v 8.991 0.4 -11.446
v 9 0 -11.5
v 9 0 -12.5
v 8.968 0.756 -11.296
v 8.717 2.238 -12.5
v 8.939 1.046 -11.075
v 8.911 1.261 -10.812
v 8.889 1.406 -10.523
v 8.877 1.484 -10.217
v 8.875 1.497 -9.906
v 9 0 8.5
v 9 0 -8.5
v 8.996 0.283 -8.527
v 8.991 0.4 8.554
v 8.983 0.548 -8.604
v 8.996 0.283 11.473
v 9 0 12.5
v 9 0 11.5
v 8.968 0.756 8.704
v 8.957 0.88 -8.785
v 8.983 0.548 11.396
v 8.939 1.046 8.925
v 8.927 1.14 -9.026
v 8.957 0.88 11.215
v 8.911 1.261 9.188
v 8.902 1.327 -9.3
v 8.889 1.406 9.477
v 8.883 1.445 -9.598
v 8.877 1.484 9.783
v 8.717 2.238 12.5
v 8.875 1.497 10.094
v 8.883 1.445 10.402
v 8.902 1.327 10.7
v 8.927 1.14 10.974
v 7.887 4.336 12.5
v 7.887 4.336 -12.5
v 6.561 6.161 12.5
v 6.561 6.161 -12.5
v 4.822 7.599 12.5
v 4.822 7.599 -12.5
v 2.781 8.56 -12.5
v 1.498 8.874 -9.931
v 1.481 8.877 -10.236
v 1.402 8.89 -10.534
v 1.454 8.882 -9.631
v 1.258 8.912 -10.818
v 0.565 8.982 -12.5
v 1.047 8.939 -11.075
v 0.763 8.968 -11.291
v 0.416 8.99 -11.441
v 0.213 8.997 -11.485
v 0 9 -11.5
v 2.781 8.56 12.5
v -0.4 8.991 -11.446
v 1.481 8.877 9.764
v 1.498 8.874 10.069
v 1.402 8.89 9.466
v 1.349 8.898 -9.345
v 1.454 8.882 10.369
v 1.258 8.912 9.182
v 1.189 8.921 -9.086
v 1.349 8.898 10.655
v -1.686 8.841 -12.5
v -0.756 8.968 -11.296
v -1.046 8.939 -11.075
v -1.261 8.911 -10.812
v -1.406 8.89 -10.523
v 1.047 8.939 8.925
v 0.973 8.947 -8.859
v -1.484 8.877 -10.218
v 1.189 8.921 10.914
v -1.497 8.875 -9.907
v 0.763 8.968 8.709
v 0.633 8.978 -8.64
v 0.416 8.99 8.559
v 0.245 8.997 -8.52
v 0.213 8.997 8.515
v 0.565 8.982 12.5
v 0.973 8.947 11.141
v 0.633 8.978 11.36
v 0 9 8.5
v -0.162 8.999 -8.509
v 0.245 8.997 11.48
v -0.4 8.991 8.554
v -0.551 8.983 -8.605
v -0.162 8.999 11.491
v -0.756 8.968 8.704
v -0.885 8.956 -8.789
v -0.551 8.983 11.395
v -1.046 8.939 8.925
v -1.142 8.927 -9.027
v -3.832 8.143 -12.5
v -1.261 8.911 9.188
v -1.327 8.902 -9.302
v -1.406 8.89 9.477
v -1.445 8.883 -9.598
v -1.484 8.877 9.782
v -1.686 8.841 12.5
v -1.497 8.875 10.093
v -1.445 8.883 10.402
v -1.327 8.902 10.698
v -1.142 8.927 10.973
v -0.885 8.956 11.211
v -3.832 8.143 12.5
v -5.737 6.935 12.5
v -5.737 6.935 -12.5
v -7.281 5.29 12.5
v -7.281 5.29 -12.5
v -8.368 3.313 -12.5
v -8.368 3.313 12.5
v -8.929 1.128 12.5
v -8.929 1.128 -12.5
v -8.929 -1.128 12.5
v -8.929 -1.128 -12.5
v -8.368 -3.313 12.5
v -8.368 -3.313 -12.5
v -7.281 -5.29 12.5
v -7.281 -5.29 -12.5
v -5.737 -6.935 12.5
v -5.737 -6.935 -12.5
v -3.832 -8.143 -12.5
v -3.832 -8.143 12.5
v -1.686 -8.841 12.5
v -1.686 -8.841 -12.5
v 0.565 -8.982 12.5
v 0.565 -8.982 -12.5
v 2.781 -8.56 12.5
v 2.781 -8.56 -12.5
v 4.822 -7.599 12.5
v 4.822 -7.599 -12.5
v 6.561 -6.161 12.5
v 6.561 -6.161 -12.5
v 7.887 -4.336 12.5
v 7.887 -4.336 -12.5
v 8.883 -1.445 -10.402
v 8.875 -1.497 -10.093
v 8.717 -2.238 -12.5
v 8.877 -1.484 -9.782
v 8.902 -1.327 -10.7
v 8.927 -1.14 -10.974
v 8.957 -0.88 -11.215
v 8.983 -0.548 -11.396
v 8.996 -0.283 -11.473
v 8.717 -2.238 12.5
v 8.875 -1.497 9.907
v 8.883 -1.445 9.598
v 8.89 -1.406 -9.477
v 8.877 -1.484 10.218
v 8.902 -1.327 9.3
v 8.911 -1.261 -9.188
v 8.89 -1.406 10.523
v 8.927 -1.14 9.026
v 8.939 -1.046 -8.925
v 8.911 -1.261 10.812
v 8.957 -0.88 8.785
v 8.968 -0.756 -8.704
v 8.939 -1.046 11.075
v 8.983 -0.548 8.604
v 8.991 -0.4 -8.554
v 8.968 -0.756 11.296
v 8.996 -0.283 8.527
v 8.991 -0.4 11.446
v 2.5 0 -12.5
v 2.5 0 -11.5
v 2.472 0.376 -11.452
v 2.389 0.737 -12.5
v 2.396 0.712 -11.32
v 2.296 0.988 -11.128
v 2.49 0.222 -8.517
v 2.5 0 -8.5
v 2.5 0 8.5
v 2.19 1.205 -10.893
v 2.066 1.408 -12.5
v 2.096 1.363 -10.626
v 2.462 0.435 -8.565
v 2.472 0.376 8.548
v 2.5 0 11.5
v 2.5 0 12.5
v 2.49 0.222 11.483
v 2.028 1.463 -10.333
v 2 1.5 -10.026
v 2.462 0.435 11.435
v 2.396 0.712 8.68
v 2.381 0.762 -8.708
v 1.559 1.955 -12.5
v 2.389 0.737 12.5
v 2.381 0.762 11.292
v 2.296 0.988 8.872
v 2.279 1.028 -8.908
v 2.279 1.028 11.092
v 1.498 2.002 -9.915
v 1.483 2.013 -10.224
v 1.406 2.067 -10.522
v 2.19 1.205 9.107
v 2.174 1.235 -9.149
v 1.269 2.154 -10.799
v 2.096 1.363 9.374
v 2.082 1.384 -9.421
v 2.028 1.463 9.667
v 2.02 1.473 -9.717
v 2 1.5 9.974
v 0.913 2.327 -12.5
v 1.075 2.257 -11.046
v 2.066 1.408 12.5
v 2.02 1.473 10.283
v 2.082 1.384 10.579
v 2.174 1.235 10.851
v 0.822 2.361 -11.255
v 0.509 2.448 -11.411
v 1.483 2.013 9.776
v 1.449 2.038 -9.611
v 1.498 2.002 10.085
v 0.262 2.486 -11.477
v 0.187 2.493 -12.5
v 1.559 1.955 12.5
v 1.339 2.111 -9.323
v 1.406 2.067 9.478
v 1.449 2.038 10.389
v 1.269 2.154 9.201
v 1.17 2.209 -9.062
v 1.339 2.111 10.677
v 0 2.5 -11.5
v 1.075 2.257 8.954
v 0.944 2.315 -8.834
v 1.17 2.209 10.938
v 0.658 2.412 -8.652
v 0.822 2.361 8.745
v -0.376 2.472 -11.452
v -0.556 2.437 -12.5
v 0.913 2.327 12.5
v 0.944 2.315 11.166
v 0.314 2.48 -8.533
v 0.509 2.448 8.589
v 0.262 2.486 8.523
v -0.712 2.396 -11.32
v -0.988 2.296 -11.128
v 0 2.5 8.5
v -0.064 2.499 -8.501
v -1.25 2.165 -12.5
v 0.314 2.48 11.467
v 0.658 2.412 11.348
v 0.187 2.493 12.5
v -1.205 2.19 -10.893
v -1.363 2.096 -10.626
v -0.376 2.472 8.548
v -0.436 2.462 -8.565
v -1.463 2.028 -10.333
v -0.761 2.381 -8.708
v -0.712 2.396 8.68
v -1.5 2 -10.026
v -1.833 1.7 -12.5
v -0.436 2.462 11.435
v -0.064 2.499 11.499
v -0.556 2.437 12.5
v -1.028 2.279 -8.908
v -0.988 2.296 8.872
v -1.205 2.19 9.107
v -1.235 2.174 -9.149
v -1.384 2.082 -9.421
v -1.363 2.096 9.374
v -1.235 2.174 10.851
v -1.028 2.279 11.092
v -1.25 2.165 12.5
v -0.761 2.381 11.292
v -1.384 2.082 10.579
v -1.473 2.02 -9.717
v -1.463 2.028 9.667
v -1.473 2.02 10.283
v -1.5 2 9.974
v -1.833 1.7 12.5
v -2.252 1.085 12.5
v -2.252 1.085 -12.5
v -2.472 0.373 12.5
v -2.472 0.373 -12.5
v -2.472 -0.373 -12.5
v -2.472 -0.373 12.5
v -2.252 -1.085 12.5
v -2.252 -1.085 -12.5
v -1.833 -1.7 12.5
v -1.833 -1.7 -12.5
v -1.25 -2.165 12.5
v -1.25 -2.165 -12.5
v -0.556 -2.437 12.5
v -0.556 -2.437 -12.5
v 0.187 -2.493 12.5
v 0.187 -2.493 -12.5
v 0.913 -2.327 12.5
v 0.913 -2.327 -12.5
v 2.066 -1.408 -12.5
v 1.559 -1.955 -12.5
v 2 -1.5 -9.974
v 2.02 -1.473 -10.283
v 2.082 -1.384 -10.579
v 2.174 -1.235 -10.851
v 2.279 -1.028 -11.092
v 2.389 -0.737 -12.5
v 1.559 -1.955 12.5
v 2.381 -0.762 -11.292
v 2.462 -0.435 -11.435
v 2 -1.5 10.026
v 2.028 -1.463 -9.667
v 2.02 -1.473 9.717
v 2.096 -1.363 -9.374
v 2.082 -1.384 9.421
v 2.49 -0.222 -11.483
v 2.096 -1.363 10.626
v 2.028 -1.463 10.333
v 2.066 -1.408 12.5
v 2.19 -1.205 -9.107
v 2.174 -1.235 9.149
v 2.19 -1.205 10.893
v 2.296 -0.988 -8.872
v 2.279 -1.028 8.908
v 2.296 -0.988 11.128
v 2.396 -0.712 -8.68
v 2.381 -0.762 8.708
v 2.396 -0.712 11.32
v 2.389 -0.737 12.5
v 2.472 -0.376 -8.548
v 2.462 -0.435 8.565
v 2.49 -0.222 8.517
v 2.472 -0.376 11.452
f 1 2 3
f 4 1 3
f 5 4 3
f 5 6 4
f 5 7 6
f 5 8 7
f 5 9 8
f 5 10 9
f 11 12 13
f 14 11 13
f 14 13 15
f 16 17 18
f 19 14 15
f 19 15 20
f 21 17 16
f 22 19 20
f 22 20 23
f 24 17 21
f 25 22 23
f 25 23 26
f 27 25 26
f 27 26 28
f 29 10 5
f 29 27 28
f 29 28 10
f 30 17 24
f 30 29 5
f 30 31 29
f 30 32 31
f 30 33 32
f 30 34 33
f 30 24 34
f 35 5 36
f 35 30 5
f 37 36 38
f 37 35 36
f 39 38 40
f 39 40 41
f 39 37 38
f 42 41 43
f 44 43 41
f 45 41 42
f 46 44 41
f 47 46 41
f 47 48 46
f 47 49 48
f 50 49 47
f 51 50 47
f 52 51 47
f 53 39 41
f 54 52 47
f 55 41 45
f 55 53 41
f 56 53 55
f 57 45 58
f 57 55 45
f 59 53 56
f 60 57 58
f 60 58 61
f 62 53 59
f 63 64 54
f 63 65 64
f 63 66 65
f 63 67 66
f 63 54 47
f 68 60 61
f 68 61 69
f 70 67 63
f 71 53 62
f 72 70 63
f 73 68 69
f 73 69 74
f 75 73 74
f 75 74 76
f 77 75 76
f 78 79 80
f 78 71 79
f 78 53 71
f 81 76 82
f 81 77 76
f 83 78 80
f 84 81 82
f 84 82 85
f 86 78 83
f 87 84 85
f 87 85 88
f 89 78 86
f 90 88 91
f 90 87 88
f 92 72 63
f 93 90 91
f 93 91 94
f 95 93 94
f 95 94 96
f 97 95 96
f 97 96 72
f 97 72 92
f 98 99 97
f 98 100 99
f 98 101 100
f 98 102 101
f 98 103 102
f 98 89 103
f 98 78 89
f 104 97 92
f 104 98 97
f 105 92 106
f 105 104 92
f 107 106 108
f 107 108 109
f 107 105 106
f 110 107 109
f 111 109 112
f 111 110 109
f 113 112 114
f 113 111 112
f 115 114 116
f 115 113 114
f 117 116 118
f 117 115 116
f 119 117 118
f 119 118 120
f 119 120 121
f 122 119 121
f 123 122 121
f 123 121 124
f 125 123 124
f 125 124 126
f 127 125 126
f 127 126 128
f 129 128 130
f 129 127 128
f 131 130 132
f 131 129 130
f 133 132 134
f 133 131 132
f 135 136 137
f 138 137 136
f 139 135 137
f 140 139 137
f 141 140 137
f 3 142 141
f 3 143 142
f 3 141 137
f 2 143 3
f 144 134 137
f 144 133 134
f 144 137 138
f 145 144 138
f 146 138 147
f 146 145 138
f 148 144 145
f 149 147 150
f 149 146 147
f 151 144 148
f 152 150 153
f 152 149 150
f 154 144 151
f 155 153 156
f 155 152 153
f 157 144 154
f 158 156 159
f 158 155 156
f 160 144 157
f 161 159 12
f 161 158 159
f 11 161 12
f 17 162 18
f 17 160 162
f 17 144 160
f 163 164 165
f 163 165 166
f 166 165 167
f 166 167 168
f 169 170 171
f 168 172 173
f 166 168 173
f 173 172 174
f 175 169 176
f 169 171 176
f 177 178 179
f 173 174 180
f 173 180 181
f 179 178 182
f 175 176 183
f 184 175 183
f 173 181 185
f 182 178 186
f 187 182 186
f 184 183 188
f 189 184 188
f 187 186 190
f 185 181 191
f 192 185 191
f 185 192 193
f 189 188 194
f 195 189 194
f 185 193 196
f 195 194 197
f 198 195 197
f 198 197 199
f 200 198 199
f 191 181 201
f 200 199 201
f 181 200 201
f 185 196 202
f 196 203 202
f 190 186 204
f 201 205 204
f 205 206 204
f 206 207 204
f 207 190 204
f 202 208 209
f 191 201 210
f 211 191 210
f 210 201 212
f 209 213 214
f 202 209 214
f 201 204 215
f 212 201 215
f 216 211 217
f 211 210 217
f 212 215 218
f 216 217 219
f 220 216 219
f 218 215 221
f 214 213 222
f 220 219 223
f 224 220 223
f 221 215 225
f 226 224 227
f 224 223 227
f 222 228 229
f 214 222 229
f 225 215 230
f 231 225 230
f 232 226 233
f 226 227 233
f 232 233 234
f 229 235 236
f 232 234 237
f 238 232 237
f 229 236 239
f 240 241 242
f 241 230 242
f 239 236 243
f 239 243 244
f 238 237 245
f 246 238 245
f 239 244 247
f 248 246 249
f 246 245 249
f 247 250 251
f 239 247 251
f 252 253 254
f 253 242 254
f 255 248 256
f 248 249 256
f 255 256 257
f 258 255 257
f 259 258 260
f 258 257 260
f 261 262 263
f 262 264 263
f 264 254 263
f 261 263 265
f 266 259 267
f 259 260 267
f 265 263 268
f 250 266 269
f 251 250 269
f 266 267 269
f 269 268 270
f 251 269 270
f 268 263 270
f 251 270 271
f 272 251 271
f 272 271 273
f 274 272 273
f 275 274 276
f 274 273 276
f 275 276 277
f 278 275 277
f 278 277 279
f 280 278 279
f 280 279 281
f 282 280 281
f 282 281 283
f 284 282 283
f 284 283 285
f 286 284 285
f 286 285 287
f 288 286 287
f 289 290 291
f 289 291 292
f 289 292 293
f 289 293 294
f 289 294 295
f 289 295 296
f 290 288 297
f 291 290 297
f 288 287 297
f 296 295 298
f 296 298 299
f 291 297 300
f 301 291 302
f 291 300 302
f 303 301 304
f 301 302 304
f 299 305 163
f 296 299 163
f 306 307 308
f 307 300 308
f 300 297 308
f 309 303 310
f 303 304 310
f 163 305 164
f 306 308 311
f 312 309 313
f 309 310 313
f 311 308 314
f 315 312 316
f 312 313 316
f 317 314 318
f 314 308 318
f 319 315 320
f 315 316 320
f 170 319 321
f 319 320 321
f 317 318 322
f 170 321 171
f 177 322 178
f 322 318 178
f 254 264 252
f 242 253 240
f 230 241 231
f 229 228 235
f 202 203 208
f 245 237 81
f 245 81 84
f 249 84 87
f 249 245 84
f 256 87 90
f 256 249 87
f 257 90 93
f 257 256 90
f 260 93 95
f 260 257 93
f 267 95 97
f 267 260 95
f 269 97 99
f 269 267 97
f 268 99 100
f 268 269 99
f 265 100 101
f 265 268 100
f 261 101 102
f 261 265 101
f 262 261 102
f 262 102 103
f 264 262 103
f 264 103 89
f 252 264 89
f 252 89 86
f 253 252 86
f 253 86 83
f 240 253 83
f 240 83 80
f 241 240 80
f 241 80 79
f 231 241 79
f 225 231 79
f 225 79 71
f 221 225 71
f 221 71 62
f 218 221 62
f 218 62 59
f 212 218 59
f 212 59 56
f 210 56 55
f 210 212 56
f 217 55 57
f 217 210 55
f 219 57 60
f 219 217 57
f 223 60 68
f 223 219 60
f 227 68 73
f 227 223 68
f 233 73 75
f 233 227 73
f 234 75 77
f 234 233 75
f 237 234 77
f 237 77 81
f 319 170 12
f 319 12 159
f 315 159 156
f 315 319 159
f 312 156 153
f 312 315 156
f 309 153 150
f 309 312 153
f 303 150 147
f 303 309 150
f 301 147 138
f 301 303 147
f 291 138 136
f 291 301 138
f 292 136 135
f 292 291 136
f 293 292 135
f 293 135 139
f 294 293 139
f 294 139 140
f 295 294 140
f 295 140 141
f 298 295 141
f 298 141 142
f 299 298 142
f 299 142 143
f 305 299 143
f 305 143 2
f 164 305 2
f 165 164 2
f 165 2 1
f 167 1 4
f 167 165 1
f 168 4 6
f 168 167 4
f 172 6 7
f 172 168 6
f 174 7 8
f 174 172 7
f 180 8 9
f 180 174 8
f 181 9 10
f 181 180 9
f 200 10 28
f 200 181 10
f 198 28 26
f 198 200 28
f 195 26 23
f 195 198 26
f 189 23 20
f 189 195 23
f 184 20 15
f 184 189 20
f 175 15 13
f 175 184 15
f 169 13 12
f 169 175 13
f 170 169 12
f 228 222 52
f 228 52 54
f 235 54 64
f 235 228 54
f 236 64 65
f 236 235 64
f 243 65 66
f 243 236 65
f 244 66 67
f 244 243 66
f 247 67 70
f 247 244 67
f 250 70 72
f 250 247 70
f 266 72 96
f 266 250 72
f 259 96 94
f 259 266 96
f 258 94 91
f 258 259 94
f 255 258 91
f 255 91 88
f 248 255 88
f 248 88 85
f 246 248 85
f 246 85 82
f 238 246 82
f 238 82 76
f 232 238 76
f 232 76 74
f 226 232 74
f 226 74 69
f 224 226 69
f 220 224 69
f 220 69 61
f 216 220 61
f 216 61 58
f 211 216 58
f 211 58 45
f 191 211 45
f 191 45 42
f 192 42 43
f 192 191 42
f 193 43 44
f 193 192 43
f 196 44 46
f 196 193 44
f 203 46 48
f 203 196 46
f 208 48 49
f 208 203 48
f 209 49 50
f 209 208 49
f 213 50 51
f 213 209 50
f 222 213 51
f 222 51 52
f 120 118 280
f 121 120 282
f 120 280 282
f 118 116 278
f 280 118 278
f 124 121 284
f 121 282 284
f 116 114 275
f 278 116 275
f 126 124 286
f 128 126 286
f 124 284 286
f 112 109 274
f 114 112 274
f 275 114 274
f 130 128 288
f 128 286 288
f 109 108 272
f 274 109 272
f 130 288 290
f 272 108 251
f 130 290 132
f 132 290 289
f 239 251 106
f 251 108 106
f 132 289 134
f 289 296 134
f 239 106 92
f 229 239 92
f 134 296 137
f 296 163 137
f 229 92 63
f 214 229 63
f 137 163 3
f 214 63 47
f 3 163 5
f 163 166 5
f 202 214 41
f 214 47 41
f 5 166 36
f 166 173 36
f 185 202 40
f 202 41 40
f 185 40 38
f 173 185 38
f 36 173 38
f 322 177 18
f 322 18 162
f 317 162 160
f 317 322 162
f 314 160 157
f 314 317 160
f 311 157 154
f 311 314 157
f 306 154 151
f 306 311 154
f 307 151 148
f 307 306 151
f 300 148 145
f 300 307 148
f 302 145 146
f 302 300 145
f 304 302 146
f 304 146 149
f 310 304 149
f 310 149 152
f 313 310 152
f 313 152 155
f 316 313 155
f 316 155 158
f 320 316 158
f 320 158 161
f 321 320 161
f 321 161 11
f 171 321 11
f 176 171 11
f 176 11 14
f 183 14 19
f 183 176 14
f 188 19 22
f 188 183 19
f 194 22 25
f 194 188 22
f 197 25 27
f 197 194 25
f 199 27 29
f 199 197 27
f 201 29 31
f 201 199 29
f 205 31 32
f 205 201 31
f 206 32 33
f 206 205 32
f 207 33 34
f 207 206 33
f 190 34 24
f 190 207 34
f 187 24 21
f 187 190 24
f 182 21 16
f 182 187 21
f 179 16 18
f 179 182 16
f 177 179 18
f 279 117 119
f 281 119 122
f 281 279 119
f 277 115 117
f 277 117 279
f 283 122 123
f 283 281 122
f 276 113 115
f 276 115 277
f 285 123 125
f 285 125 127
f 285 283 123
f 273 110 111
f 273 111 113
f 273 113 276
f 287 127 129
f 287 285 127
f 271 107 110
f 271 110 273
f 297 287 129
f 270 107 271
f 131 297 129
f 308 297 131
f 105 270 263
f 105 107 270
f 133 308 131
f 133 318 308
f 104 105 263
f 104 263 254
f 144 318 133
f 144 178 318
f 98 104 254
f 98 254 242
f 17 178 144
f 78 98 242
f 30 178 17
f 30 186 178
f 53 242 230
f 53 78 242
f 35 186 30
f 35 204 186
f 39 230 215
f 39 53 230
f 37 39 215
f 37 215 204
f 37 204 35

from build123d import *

# Parameters (mm, degrees)
SKETCH1_R           = 9
BOSS_EXTRUDE1_DEPTH = 12.5
SKETCH2_R           = 2.5
CUT_EXTRUDE1_DEPTH  = 29.053520278
SKETCH3_R           = 1.5
CUT_EXTRUDE2_DEPTH  = 18.839562775
SKETCH4_R           = 1.5
CUT_EXTRUDE3_DEPTH  = 18.839562946


with BuildPart() as part:
    # Sketch1 → Boss-Extrude1 (new, symmetric)
    with BuildSketch(Plane.XY):
        Circle(SKETCH1_R)
    extrude(amount=BOSS_EXTRUDE1_DEPTH, both=True)

    # Sketch2 → Cut-Extrude1 (cut, through all)
    with BuildSketch(Plane.XY.offset(12.5)):
        Circle(SKETCH2_R)
    extrude(amount=-CUT_EXTRUDE1_DEPTH, mode=Mode.SUBTRACT)

    # Sketch3 → Cut-Extrude2 (cut, through all)
    with BuildSketch(Plane(origin=(0, 0, 0), x_dir=(1, 0, 0), z_dir=(0, 1, 0))):
        with Locations(Location((0, 10, 0), (0, 0, 90))):
            Circle(SKETCH3_R)
        with Locations(Location((0, -10, 0), (0, 0, 90))):
            Circle(SKETCH3_R)
    extrude(amount=CUT_EXTRUDE2_DEPTH, mode=Mode.SUBTRACT)

    # Sketch4 → Cut-Extrude3 (cut, through all)
    with BuildSketch(Plane(origin=(0, 0, 0), x_dir=(0, 0, -1), z_dir=(1, 0, 0))):
        with Locations(Location((-10, 0, 0), (0, 0, 180))):
            Circle(SKETCH4_R)
        with Locations(Location((10, 0, 0), (0, 0, 180))):
            Circle(SKETCH4_R)
    extrude(amount=CUT_EXTRUDE3_DEPTH, mode=Mode.SUBTRACT)


solid = part.part
